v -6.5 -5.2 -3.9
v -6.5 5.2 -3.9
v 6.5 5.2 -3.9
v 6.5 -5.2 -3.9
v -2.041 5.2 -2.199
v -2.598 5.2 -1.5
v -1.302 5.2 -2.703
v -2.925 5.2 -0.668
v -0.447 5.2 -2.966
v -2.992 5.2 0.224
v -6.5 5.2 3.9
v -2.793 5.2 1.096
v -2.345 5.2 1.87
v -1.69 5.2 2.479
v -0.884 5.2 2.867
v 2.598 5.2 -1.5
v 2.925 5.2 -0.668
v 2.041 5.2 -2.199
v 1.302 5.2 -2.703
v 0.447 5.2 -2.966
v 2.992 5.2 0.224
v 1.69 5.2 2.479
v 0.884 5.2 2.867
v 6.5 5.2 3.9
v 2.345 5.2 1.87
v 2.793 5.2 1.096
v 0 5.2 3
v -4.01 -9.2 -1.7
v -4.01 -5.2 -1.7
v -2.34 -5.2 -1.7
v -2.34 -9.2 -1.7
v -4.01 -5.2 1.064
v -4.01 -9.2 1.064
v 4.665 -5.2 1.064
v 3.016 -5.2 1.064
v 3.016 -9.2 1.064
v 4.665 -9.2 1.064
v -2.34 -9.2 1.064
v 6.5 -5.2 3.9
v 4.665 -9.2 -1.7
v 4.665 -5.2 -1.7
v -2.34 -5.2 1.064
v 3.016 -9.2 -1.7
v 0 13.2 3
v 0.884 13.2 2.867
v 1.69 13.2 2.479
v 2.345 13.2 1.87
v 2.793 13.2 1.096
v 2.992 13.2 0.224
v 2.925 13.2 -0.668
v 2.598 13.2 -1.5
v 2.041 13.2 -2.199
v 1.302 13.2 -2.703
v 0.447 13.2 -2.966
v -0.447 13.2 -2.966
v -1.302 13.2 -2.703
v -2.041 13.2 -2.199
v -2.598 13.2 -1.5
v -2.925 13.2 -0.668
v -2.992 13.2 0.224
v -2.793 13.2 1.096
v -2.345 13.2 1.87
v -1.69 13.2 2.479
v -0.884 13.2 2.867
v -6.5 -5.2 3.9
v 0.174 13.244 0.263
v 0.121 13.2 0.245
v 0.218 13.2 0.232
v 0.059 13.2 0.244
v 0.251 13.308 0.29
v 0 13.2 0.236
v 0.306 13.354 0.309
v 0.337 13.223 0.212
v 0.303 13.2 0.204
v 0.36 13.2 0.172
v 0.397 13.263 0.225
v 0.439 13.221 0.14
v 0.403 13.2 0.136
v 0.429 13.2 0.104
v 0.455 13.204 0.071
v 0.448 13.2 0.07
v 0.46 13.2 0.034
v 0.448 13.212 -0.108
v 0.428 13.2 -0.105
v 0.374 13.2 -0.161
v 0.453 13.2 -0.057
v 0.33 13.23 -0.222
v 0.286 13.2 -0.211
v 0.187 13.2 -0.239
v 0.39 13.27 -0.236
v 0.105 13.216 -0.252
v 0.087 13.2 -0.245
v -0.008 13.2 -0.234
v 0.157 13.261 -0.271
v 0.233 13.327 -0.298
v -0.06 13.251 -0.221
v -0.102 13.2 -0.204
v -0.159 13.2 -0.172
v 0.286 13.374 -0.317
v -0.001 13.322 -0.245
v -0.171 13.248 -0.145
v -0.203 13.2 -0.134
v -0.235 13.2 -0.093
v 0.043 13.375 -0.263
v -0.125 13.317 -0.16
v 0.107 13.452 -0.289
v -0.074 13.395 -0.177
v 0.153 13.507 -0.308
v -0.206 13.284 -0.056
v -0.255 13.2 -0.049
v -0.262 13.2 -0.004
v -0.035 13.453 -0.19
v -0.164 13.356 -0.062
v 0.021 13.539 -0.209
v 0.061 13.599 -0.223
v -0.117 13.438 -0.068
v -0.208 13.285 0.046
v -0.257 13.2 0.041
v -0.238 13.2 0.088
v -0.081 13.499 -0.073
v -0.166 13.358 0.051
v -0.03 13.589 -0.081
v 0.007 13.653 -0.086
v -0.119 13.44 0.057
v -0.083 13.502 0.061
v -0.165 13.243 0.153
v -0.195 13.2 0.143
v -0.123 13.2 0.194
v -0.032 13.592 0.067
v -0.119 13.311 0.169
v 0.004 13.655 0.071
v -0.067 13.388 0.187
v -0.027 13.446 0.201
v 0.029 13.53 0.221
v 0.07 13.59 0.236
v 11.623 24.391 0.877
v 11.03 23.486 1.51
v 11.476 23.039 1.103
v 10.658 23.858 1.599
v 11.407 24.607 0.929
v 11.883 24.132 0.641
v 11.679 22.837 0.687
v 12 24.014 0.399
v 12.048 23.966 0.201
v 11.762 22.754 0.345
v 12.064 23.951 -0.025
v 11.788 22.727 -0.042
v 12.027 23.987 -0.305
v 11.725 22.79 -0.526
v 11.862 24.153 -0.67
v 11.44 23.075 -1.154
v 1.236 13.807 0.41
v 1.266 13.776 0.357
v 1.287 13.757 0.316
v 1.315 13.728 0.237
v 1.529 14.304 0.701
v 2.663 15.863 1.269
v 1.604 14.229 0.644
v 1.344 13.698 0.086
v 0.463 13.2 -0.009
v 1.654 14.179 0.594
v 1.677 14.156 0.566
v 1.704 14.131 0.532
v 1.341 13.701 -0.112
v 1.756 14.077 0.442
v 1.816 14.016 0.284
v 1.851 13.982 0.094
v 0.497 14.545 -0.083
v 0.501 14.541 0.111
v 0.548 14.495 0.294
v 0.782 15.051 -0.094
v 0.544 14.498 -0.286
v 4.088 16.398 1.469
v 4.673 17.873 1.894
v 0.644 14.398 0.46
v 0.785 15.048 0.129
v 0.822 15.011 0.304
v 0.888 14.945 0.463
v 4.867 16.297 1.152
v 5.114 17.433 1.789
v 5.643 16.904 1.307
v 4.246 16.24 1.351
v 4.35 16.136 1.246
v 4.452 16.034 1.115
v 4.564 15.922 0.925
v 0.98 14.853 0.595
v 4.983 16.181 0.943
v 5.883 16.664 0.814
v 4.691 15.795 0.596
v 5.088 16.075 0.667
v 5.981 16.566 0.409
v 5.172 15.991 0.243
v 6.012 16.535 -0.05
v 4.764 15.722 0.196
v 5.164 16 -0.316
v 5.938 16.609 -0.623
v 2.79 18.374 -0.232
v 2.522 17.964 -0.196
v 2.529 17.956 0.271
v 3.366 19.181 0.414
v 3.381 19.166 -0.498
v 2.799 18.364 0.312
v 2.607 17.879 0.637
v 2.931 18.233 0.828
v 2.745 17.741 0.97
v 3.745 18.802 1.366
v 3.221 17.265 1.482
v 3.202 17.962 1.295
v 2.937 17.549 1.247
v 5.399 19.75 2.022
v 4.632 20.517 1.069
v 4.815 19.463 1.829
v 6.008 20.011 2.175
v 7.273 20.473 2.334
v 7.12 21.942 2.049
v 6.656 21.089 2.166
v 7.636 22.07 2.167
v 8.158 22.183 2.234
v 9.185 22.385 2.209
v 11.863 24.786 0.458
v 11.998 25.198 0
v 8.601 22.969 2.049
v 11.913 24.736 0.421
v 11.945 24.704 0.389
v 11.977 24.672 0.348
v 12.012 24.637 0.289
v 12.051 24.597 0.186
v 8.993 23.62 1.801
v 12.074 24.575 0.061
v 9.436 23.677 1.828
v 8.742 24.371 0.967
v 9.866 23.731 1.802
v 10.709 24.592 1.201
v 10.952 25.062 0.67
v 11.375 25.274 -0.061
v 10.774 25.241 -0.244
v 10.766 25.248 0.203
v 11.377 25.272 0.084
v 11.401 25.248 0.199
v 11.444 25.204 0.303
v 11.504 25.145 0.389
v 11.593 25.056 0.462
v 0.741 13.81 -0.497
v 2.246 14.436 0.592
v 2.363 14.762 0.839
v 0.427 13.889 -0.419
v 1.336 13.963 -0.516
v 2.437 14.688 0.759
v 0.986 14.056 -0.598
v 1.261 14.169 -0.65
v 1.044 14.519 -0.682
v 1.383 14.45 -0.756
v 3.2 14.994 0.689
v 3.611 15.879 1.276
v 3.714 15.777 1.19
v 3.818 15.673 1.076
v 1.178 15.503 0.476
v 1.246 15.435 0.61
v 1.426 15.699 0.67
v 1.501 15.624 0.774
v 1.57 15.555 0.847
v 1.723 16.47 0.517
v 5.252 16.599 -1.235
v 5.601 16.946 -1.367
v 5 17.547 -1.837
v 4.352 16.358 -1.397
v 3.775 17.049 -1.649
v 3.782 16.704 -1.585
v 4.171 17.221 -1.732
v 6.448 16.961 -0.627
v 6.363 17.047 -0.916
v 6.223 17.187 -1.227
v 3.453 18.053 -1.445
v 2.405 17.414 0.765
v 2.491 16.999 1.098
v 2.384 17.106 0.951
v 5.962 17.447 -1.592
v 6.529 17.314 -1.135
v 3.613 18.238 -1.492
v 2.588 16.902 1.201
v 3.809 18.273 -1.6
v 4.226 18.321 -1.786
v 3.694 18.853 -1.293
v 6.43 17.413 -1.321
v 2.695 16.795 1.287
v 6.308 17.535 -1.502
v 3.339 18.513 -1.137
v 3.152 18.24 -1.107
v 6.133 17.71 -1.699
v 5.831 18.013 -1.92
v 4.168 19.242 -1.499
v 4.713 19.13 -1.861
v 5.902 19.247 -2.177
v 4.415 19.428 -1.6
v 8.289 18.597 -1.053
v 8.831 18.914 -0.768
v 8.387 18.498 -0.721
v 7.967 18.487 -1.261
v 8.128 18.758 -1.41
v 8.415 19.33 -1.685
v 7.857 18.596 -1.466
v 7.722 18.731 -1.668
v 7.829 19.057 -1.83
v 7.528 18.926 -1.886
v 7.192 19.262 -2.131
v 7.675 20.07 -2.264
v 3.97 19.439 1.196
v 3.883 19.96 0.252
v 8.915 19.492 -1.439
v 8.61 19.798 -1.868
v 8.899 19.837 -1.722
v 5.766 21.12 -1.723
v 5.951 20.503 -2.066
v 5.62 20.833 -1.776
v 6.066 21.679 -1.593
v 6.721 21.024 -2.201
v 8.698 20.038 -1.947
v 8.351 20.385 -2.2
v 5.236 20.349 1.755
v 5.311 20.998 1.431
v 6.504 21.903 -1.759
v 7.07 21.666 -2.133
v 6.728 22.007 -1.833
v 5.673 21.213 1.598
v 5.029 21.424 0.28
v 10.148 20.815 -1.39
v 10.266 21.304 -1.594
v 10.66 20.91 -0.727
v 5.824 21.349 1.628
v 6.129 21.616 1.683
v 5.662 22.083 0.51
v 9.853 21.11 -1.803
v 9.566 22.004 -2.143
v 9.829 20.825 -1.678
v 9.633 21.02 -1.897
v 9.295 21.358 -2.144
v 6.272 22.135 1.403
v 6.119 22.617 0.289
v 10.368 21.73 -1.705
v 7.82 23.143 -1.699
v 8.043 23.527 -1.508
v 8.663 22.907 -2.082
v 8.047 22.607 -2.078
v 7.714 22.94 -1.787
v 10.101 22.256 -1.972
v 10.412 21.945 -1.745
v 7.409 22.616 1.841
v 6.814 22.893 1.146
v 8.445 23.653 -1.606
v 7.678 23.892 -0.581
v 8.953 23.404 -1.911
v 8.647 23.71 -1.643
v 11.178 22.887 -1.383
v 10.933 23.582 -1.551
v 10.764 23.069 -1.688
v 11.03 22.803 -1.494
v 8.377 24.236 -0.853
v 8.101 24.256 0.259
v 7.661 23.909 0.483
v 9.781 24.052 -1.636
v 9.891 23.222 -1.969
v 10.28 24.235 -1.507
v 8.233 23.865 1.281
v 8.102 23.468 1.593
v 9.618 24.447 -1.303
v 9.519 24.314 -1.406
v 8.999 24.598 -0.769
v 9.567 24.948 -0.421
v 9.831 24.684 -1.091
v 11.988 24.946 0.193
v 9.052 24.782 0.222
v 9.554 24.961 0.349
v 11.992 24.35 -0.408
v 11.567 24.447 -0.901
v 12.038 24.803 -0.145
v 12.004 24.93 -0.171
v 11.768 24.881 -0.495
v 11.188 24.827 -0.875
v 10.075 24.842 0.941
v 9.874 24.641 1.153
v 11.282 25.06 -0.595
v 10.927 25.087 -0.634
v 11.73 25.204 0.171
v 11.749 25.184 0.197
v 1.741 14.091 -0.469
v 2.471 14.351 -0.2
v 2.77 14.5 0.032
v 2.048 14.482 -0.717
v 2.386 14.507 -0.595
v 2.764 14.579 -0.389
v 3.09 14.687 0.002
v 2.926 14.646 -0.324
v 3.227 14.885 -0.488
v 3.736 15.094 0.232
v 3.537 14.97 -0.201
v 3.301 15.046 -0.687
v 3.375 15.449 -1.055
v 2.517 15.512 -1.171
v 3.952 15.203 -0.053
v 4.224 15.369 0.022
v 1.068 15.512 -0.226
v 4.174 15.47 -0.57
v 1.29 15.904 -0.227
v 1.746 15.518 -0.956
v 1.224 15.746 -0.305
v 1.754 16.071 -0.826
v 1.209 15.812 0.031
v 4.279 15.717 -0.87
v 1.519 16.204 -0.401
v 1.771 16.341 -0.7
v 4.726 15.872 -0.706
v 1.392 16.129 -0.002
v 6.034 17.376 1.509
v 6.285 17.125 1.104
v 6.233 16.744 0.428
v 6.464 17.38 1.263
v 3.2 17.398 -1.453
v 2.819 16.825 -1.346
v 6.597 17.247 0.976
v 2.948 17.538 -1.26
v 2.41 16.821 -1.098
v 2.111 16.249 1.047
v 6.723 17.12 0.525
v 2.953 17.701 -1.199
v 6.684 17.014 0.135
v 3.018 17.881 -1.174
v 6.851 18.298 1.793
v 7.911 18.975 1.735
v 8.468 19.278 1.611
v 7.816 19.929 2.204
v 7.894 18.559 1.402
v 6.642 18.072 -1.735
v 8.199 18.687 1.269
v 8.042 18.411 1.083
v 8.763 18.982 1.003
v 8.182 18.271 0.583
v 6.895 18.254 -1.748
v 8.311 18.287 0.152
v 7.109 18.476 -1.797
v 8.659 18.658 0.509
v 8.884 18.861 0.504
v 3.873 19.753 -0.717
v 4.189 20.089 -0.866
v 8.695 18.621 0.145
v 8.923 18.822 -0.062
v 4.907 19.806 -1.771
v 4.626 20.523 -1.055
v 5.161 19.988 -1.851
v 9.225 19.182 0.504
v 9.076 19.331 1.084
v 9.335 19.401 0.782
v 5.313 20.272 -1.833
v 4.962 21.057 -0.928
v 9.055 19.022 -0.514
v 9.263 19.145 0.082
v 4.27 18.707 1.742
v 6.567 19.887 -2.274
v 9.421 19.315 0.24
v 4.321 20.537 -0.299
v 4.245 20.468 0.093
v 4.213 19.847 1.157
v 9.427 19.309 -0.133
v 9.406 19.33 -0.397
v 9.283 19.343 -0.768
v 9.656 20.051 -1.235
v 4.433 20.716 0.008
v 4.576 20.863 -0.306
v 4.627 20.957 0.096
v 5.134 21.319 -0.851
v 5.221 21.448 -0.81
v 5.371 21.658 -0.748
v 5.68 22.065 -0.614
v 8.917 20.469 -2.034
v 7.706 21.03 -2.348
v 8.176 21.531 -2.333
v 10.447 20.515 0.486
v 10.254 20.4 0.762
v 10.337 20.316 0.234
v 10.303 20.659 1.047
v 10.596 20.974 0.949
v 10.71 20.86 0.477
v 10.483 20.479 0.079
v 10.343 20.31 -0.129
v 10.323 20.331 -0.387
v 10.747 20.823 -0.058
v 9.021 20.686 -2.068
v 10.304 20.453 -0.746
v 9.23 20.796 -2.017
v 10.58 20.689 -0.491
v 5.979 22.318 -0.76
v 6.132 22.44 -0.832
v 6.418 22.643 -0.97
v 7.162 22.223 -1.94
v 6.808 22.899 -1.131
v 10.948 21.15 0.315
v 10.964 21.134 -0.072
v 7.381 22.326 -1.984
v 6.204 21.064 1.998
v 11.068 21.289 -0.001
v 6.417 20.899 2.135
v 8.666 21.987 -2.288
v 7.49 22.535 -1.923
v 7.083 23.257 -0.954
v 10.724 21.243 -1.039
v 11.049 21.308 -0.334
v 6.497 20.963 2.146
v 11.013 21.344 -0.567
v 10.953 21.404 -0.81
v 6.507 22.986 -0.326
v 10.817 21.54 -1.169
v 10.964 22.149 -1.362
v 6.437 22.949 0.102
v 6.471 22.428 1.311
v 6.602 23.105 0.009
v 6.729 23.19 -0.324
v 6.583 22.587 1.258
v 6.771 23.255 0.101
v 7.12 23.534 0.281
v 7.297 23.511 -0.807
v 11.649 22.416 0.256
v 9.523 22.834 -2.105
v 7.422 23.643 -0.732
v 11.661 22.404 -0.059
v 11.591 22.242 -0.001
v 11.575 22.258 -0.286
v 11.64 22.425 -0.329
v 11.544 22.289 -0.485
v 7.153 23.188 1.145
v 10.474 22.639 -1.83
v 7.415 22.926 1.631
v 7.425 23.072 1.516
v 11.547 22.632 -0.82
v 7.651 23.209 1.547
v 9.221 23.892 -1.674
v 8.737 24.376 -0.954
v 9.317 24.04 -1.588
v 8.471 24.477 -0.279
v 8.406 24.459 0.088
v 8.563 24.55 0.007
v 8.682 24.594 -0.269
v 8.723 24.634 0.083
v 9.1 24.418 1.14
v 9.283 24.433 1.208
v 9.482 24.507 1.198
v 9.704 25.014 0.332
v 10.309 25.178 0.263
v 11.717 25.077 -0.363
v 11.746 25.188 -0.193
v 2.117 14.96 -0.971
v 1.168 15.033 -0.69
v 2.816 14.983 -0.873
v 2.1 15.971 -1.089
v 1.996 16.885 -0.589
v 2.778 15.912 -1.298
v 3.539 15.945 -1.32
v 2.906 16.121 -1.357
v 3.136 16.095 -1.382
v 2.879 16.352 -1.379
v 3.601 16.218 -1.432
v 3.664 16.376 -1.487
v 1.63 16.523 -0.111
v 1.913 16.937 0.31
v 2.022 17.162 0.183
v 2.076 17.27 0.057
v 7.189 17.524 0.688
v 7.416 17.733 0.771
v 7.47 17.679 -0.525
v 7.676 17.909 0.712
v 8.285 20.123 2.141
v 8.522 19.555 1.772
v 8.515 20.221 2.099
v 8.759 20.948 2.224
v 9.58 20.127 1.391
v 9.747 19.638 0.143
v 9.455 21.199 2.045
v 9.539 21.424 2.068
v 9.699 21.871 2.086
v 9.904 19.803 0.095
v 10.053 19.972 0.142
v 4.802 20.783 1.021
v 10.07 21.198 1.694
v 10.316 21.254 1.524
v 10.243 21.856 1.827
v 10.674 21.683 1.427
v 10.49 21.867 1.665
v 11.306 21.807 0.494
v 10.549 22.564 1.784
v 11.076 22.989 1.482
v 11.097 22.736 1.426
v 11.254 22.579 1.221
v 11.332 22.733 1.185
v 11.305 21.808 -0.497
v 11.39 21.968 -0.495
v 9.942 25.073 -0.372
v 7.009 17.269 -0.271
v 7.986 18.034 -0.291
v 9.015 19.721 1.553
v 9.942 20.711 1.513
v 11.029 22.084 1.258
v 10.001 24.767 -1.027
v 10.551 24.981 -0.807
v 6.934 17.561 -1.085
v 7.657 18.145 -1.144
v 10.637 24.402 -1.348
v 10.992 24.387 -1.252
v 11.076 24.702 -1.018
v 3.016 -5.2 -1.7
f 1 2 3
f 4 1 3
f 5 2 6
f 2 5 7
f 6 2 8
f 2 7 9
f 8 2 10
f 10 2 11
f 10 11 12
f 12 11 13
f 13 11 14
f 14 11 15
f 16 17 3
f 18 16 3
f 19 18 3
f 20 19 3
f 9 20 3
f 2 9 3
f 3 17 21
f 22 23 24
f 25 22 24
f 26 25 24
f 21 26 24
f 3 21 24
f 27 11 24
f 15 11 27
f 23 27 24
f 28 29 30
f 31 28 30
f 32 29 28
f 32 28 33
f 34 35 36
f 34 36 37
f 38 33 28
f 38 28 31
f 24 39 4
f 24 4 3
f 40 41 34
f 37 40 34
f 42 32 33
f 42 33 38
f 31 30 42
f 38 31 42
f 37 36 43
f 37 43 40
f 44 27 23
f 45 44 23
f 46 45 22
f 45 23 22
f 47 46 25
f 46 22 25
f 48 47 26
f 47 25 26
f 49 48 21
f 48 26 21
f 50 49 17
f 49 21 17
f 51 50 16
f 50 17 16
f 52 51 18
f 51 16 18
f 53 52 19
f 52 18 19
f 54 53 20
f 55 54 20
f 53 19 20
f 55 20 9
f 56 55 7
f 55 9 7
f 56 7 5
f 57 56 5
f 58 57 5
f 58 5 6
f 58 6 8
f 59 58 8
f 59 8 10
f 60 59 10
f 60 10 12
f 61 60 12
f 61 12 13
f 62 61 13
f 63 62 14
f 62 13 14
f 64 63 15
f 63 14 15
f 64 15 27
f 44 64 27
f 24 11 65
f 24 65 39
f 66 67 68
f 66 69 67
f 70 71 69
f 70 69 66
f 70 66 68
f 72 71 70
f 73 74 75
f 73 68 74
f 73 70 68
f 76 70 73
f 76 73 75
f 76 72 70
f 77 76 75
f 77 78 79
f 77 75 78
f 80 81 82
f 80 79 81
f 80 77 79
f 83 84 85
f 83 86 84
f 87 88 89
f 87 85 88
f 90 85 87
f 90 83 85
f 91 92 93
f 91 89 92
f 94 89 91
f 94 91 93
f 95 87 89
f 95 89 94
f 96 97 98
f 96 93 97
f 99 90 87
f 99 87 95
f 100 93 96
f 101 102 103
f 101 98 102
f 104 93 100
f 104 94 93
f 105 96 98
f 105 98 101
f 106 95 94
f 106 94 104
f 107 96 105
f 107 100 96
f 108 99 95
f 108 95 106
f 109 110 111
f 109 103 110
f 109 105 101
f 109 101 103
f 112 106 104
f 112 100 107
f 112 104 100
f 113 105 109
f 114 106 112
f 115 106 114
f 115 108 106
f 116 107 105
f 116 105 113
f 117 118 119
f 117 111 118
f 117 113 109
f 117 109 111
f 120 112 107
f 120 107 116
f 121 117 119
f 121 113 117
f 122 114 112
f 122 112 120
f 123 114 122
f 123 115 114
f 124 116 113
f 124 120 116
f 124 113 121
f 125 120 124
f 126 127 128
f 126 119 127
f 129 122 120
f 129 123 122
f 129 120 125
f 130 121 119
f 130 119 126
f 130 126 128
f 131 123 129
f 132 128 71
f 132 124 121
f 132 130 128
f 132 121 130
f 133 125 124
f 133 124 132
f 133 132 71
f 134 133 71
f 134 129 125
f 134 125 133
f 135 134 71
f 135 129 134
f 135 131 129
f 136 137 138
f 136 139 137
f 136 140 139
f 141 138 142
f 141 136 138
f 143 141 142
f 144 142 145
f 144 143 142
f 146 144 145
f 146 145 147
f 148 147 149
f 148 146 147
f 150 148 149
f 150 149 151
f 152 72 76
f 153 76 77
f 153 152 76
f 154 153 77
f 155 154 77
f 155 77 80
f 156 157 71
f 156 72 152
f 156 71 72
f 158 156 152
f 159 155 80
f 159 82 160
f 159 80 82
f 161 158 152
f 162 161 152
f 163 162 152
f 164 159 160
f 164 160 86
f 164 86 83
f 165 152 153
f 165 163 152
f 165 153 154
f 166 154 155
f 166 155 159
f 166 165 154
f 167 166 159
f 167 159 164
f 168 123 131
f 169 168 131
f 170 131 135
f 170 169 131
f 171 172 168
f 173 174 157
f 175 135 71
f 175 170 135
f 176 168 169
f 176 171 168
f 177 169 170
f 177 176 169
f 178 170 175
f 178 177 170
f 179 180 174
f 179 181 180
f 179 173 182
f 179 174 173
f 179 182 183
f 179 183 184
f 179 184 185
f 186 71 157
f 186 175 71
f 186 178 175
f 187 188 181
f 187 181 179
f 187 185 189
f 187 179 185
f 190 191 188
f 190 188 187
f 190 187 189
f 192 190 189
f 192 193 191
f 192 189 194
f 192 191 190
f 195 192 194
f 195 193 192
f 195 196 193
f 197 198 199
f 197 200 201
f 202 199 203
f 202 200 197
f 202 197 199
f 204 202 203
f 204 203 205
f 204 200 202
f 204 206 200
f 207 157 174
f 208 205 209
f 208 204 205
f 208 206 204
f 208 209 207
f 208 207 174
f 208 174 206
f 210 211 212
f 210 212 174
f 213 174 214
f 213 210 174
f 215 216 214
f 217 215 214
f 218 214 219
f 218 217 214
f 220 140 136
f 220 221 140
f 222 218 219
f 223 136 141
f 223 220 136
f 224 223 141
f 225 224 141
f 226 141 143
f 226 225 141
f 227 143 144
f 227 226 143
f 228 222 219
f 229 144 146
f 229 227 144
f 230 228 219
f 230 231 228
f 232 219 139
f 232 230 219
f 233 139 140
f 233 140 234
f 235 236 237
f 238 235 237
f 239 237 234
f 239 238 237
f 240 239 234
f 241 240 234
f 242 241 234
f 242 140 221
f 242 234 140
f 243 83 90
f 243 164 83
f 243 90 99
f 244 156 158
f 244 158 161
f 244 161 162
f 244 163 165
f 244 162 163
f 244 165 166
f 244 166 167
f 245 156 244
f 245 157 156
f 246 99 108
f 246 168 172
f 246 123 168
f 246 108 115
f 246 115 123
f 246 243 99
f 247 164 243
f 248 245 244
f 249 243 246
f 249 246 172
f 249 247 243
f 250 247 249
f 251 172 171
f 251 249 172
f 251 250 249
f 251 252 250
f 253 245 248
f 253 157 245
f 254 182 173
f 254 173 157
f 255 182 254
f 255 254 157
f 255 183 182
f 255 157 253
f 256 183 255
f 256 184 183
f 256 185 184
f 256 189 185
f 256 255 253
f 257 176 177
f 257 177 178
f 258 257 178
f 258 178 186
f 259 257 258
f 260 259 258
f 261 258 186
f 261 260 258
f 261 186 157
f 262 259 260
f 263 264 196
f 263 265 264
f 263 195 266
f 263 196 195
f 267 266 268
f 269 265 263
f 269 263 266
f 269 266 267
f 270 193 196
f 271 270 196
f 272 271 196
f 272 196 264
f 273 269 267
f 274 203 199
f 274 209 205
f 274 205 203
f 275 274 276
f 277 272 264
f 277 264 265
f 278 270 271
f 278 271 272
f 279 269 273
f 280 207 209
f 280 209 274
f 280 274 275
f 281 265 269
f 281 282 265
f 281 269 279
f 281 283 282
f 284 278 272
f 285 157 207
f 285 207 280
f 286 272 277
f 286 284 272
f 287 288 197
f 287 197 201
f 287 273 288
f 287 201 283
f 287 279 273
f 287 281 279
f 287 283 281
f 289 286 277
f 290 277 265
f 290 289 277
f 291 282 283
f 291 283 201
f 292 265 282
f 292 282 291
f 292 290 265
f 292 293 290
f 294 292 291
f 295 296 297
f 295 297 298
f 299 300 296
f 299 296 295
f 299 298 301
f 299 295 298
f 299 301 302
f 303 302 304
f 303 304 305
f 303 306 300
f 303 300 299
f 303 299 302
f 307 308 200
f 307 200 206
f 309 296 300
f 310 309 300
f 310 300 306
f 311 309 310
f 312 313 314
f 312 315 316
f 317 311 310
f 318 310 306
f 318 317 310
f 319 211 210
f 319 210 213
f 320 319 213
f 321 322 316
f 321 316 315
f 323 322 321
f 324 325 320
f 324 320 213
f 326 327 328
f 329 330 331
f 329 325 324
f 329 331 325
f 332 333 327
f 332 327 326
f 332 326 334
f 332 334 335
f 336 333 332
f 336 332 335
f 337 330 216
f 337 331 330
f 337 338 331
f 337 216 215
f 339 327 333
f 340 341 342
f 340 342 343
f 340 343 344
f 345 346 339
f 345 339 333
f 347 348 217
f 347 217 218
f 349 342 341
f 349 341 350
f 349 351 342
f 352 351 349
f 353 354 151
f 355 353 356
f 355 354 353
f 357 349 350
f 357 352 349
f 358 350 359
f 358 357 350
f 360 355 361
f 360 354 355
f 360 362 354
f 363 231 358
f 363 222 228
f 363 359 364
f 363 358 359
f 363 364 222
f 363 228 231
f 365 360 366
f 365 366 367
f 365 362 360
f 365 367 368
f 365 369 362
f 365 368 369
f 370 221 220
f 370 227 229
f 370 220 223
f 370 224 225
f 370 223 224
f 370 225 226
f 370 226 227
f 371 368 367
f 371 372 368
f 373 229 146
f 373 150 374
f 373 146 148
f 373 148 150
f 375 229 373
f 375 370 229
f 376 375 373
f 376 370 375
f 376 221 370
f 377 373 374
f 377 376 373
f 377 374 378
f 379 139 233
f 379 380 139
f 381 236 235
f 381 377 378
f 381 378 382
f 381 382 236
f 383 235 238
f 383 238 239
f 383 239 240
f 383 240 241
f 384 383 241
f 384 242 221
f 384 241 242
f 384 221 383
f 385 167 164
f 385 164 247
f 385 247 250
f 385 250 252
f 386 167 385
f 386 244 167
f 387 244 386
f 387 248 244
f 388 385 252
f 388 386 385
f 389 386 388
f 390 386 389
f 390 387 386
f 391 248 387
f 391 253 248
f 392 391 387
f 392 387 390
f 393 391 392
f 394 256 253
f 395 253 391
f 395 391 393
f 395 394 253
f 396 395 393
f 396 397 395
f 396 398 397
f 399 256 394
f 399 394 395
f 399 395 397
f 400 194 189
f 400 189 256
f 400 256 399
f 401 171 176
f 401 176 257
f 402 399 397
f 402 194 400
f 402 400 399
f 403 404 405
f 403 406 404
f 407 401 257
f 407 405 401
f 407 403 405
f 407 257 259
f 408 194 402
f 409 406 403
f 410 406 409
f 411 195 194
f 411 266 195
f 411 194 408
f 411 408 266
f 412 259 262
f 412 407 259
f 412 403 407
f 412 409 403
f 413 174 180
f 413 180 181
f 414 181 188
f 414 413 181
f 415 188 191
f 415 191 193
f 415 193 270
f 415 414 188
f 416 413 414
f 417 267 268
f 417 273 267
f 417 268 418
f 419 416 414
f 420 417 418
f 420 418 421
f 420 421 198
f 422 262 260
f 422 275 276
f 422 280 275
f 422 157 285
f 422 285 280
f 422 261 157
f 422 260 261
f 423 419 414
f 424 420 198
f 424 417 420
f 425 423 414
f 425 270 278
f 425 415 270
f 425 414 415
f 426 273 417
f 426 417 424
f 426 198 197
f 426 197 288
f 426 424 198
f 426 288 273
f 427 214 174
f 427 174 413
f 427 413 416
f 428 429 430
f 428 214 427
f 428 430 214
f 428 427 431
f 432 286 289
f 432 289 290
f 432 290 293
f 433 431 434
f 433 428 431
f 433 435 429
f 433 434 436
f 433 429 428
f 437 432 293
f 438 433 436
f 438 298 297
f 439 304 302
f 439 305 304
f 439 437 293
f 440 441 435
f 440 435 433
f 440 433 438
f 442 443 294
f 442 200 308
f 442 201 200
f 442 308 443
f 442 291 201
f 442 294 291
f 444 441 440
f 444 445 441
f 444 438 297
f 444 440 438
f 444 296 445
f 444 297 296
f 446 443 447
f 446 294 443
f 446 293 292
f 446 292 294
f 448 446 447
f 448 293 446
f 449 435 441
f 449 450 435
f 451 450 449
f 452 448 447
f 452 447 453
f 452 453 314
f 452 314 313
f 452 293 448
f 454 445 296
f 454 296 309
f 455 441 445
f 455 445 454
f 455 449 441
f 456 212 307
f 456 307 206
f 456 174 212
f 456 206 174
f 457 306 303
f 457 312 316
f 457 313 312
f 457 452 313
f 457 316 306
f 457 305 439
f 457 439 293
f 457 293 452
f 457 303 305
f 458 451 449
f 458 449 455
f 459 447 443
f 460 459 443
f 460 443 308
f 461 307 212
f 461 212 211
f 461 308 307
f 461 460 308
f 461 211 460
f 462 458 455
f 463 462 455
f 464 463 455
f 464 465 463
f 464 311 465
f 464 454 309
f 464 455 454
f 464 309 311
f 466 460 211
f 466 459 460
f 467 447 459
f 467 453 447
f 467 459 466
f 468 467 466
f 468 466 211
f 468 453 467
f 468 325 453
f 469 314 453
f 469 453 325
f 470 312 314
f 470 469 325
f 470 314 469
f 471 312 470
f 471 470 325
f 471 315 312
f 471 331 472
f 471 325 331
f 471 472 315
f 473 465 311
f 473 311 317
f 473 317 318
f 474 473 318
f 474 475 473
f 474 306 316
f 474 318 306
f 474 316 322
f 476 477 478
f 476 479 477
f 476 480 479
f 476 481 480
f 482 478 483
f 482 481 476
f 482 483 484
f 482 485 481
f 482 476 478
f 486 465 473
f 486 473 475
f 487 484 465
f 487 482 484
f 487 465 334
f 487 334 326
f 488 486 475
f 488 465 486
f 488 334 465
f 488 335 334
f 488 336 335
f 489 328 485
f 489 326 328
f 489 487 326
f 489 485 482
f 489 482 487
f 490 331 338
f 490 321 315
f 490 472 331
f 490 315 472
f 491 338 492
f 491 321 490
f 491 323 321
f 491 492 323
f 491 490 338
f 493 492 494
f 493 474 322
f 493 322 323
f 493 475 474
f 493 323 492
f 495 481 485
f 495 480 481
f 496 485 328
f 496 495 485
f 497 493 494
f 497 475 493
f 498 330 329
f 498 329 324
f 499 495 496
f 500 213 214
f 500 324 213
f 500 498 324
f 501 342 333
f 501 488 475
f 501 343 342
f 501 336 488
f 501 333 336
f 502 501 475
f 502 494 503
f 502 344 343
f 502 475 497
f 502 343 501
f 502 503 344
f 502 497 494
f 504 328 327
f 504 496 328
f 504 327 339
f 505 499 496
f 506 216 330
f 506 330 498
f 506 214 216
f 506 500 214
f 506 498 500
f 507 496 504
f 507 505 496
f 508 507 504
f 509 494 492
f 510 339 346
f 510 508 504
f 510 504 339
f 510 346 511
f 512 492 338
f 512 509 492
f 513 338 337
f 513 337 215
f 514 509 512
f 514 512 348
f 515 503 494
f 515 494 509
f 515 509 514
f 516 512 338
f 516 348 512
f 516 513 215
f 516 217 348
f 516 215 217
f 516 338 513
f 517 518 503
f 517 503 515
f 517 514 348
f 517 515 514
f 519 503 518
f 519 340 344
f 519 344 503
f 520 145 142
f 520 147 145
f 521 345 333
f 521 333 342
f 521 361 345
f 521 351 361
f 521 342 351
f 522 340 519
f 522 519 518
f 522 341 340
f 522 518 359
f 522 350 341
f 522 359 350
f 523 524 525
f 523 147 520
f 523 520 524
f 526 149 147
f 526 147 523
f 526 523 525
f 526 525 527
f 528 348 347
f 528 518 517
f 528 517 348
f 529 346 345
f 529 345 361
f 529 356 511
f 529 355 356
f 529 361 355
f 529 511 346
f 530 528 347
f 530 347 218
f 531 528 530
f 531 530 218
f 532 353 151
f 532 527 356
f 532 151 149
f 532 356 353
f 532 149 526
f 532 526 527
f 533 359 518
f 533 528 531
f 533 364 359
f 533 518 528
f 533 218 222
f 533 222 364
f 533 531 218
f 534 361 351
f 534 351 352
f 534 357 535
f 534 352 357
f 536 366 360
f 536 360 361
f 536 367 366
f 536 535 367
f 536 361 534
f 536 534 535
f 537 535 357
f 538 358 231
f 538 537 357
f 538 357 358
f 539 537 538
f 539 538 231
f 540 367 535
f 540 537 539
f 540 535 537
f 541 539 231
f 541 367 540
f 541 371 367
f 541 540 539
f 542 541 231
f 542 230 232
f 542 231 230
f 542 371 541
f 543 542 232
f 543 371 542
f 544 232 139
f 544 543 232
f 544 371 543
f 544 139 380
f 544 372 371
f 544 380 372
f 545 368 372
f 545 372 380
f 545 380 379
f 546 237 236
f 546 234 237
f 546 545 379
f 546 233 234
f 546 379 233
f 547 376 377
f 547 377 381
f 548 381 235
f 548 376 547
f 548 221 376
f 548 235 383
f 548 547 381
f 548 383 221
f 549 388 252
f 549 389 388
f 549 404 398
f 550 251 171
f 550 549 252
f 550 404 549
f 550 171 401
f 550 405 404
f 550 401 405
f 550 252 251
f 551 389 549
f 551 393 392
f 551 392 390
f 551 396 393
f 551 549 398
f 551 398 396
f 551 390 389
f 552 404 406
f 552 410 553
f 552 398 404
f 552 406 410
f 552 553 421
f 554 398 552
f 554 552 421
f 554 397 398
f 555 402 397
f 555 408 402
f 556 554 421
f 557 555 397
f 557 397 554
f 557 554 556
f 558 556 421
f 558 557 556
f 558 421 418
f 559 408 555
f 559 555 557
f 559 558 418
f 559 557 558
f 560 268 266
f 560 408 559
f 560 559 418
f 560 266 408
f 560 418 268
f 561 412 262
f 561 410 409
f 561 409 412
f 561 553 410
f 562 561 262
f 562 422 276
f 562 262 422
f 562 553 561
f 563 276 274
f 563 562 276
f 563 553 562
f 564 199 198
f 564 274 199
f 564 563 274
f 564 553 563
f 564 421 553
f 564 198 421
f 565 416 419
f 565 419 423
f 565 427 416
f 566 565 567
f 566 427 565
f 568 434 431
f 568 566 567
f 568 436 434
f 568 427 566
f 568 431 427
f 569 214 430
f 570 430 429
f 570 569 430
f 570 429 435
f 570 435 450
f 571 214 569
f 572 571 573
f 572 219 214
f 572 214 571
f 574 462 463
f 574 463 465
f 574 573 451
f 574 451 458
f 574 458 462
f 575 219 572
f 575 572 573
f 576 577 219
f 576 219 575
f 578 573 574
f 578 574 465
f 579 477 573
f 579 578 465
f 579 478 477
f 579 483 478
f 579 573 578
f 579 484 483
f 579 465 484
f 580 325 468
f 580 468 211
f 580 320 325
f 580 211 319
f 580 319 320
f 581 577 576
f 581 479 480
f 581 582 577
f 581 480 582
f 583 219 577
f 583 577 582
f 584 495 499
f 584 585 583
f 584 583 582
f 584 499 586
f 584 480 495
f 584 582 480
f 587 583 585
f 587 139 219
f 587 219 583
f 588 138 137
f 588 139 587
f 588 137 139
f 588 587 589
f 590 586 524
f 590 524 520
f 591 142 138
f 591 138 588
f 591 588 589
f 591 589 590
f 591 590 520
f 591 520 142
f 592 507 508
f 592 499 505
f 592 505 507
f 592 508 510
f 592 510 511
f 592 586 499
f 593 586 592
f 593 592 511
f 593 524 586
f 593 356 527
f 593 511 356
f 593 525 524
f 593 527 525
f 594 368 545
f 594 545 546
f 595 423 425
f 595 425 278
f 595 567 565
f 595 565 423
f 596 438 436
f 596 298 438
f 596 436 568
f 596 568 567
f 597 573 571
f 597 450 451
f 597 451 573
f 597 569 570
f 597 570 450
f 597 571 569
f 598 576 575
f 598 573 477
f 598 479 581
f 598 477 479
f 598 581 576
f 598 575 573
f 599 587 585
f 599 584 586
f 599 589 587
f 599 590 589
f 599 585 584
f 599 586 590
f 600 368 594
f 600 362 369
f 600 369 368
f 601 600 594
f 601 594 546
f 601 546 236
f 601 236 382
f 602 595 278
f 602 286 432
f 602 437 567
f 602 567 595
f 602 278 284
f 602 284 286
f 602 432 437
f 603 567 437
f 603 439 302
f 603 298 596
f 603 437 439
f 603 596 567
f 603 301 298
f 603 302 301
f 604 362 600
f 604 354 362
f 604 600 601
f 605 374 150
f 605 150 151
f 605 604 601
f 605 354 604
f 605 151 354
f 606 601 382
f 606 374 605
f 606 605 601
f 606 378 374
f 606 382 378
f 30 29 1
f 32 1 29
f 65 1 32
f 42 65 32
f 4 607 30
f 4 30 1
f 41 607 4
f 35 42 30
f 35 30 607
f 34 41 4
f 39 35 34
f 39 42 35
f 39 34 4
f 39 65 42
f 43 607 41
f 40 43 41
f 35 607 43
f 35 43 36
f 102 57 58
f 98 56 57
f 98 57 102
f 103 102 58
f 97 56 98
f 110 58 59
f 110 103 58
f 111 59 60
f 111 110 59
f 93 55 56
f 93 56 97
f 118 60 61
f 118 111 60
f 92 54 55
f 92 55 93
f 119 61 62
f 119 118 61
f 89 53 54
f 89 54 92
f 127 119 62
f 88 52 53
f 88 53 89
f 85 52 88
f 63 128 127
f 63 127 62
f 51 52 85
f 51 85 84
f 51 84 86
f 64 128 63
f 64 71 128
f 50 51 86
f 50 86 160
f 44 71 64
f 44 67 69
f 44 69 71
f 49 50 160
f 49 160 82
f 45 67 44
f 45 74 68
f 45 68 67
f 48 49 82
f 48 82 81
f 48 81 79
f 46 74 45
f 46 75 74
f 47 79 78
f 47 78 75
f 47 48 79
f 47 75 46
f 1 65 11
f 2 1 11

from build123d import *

# Parameters (mm, degrees)
SKETCH3_W           = 13
SKETCH3_H           = 10.4
BOSS_EXTRUDE1_DEPTH = 3.9
SKETCH4_R           = 3
BOSS_EXTRUDE2_DEPTH = 8
SKETCH6_W           = 1.669818936
SKETCH6_H           = 2.764411597
SKETCH6_W_2         = 1.648906897
BOSS_EXTRUDE3_DEPTH = 4


with BuildPart() as part:
    # Sketch3 → Boss-Extrude1 (new, symmetric)
    with BuildSketch(Plane.XY):
        Rectangle(SKETCH3_W, SKETCH3_H)
    extrude(amount=BOSS_EXTRUDE1_DEPTH, both=True)

    # Sketch4 → Boss-Extrude2 (add)
    with BuildSketch(Plane(origin=(0, 5.2, 0), x_dir=(1, 0, 0), z_dir=(0, 1, 0))):
        with Locations(Location((0, 0, 0), (0, 0, 270))):
            Circle(SKETCH4_R)
    extrude(amount=BOSS_EXTRUDE2_DEPTH)

    # Sketch5 → Revolve1 (revolve)
    with BuildSketch(Plane(origin=(-6.6, 6.6, 0), x_dir=(-0.7071067811865477, -0.7071067811865475, 0), z_dir=(0.7071067811865475, -0.7071067811865477, 0))):
        with BuildLine():
            Line((-26.301723622, 0), (-8.28734559, 0))
            add(Edge.make_bspline(
                [(-8.28734559, 0), (-9.692681087, -0.059325573), (-22.80470737, -5.257488567), (-26.301723622, 0)],
                knots=[0, 0, 0, 0, 1, 1, 1, 1], degree=3))
        make_face()
    revolve(axis=Axis((0, 13.2, 0), (0.7071067811865477, 0.7071067811865474, 0)))

    # Sketch6 → Boss-Extrude3 (add)
    with BuildSketch(Plane.XZ.offset(5.2)):
        with Locations((-3.174764559, -0.318229702)):
            Rectangle(SKETCH6_W, SKETCH6_H)
        with Locations((3.840702157, -0.318229702)):
            Rectangle(SKETCH6_W_2, SKETCH6_H)
    extrude(amount=BOSS_EXTRUDE3_DEPTH)


solid = part.part
